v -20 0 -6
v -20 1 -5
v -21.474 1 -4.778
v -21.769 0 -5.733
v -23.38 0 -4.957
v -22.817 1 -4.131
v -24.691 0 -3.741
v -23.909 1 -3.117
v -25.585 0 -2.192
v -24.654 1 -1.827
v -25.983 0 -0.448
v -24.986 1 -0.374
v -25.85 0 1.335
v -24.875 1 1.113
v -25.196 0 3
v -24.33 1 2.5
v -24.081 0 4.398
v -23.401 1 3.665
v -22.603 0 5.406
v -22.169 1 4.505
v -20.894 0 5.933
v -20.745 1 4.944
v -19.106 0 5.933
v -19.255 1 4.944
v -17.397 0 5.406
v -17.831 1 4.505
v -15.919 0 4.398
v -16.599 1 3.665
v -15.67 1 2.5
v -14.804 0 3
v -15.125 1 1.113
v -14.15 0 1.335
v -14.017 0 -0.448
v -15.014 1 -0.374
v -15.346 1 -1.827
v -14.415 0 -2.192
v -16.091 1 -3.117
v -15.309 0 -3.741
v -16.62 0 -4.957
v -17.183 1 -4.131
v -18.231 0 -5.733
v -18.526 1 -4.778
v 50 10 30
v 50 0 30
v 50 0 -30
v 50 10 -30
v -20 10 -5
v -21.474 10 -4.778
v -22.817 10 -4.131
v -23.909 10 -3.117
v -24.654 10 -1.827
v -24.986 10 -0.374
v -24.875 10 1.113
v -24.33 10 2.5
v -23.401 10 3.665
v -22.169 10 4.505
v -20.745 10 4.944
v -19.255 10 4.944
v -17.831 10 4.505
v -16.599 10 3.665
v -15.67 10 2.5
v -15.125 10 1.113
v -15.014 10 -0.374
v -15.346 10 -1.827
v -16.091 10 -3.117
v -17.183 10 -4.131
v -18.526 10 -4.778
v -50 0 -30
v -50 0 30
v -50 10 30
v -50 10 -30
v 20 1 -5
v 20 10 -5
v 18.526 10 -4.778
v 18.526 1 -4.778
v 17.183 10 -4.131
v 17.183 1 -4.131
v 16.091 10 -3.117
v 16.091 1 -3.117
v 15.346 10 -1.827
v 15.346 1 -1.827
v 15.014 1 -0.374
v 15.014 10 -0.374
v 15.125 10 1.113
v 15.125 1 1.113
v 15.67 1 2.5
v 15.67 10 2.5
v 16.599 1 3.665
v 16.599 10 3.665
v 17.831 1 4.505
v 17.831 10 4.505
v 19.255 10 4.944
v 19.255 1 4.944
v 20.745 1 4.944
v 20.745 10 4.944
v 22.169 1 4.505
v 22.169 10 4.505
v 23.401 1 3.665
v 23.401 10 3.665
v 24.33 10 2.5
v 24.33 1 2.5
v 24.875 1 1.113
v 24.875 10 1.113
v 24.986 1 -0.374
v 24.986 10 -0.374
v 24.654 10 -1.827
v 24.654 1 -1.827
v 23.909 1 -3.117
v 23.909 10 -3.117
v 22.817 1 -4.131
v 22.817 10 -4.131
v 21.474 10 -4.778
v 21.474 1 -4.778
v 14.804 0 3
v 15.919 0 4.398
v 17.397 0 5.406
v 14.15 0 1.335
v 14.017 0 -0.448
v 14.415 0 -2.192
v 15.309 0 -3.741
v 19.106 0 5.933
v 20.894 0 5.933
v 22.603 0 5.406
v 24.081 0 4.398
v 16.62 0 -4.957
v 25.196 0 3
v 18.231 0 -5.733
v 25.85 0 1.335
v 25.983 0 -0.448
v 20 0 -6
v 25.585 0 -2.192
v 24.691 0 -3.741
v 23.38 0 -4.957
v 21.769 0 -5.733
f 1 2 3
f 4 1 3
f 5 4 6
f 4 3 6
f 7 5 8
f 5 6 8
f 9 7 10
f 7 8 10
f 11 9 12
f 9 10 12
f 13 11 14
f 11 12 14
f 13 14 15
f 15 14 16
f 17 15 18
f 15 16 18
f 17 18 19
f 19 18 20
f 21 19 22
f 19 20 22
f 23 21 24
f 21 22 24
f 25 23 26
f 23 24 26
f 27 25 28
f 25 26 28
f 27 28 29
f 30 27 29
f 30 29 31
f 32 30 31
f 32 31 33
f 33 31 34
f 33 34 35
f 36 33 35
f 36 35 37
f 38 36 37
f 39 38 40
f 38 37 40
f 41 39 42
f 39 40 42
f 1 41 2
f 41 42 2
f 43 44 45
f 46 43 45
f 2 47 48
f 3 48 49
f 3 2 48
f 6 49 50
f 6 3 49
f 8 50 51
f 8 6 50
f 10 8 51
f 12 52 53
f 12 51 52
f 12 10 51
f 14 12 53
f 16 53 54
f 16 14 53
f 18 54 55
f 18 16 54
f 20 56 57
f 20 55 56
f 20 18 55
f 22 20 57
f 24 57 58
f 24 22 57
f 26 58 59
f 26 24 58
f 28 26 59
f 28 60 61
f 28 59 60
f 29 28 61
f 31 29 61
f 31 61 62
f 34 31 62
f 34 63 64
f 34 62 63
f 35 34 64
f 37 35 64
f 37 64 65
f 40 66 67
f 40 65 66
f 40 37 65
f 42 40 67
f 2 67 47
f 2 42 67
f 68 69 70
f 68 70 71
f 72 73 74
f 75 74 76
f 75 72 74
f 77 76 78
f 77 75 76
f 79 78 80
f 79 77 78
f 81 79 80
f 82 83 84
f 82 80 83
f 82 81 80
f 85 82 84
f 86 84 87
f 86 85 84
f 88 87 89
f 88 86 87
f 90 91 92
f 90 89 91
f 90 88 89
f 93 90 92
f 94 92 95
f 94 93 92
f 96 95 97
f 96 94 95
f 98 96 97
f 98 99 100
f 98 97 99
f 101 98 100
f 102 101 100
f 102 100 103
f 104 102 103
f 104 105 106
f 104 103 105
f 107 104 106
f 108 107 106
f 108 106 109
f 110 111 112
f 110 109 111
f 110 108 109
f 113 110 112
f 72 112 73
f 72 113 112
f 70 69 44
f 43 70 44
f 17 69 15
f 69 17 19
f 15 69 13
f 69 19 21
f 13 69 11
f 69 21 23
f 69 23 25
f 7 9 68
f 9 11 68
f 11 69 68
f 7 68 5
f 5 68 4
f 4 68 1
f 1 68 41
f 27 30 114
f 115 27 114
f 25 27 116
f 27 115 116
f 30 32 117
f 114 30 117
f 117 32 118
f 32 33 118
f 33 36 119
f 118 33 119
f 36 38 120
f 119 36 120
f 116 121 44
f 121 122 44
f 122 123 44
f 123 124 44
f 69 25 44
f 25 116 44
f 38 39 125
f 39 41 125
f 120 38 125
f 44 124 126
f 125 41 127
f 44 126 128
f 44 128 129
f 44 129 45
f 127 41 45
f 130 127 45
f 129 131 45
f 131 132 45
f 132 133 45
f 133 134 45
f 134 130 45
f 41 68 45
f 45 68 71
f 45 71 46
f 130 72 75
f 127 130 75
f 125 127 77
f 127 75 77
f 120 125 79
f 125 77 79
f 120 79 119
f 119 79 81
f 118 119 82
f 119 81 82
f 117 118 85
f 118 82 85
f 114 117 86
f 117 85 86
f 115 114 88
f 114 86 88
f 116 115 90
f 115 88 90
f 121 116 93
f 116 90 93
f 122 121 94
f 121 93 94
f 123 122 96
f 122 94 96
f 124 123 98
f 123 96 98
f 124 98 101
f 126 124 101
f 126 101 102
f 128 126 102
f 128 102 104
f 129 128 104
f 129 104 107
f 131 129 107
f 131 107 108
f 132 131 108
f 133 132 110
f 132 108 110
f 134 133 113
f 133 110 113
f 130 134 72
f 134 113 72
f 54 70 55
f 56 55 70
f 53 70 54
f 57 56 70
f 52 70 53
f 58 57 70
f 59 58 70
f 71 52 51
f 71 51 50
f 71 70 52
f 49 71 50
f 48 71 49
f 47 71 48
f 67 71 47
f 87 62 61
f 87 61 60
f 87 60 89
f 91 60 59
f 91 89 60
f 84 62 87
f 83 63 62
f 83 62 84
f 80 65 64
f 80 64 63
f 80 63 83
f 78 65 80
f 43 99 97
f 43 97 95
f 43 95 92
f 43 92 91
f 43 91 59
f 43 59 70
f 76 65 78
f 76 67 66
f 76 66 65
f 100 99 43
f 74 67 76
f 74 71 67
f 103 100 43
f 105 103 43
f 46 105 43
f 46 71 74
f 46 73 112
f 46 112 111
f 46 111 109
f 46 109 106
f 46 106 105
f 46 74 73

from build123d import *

# Parameters (mm, degrees)
SKETCH_1_W          = 100
SKETCH_1_H          = 60
EXTRUDE_1_DEPTH     = 10
SKETCH_2_R          = 5
CUT_EXTRUDE_1_DEPTH = 20
SKETCH_3_R          = 5
CUT_EXTRUDE_2_DEPTH = 20
CHAMFER_1_SIZE      = 1


with BuildPart() as part:
    # 草图1 → 凸台-拉伸1 (new body)
    with BuildSketch(Plane(origin=(0, 0, 0), x_dir=(1, 0, 0), z_dir=(0, 1, 0))):
        Rectangle(SKETCH_1_W, SKETCH_1_H)
    extrude(amount=EXTRUDE_1_DEPTH)

    # 草图2 → 切除-拉伸1 (cut)
    with BuildSketch(Plane(origin=(0, 0, 0), x_dir=(1, 0, 0), z_dir=(0, 1, 0))):
        with Locations(Location((-20, 0, 0), (0, 0, 90))):
            Circle(SKETCH_2_R)
    extrude(amount=CUT_EXTRUDE_1_DEPTH, mode=Mode.SUBTRACT)

    # 草图3 → 切除-拉伸2 (cut)
    with BuildSketch(Plane(origin=(0, 0, 0), x_dir=(1, 0, 0), z_dir=(0, 1, 0))):
        with Locations(Location((20, 0, 0), (0, 0, 90))):
            Circle(SKETCH_3_R)
    extrude(amount=CUT_EXTRUDE_2_DEPTH, mode=Mode.SUBTRACT)

    # 倒角1
    chamfer_1_edges = [part.edges().sort_by_distance(p)[0] for p in [
        (-20, 0, 5),
        (20, 0, 5),
    ]]
    chamfer(chamfer_1_edges, length=CHAMFER_1_SIZE)


solid = part.part
